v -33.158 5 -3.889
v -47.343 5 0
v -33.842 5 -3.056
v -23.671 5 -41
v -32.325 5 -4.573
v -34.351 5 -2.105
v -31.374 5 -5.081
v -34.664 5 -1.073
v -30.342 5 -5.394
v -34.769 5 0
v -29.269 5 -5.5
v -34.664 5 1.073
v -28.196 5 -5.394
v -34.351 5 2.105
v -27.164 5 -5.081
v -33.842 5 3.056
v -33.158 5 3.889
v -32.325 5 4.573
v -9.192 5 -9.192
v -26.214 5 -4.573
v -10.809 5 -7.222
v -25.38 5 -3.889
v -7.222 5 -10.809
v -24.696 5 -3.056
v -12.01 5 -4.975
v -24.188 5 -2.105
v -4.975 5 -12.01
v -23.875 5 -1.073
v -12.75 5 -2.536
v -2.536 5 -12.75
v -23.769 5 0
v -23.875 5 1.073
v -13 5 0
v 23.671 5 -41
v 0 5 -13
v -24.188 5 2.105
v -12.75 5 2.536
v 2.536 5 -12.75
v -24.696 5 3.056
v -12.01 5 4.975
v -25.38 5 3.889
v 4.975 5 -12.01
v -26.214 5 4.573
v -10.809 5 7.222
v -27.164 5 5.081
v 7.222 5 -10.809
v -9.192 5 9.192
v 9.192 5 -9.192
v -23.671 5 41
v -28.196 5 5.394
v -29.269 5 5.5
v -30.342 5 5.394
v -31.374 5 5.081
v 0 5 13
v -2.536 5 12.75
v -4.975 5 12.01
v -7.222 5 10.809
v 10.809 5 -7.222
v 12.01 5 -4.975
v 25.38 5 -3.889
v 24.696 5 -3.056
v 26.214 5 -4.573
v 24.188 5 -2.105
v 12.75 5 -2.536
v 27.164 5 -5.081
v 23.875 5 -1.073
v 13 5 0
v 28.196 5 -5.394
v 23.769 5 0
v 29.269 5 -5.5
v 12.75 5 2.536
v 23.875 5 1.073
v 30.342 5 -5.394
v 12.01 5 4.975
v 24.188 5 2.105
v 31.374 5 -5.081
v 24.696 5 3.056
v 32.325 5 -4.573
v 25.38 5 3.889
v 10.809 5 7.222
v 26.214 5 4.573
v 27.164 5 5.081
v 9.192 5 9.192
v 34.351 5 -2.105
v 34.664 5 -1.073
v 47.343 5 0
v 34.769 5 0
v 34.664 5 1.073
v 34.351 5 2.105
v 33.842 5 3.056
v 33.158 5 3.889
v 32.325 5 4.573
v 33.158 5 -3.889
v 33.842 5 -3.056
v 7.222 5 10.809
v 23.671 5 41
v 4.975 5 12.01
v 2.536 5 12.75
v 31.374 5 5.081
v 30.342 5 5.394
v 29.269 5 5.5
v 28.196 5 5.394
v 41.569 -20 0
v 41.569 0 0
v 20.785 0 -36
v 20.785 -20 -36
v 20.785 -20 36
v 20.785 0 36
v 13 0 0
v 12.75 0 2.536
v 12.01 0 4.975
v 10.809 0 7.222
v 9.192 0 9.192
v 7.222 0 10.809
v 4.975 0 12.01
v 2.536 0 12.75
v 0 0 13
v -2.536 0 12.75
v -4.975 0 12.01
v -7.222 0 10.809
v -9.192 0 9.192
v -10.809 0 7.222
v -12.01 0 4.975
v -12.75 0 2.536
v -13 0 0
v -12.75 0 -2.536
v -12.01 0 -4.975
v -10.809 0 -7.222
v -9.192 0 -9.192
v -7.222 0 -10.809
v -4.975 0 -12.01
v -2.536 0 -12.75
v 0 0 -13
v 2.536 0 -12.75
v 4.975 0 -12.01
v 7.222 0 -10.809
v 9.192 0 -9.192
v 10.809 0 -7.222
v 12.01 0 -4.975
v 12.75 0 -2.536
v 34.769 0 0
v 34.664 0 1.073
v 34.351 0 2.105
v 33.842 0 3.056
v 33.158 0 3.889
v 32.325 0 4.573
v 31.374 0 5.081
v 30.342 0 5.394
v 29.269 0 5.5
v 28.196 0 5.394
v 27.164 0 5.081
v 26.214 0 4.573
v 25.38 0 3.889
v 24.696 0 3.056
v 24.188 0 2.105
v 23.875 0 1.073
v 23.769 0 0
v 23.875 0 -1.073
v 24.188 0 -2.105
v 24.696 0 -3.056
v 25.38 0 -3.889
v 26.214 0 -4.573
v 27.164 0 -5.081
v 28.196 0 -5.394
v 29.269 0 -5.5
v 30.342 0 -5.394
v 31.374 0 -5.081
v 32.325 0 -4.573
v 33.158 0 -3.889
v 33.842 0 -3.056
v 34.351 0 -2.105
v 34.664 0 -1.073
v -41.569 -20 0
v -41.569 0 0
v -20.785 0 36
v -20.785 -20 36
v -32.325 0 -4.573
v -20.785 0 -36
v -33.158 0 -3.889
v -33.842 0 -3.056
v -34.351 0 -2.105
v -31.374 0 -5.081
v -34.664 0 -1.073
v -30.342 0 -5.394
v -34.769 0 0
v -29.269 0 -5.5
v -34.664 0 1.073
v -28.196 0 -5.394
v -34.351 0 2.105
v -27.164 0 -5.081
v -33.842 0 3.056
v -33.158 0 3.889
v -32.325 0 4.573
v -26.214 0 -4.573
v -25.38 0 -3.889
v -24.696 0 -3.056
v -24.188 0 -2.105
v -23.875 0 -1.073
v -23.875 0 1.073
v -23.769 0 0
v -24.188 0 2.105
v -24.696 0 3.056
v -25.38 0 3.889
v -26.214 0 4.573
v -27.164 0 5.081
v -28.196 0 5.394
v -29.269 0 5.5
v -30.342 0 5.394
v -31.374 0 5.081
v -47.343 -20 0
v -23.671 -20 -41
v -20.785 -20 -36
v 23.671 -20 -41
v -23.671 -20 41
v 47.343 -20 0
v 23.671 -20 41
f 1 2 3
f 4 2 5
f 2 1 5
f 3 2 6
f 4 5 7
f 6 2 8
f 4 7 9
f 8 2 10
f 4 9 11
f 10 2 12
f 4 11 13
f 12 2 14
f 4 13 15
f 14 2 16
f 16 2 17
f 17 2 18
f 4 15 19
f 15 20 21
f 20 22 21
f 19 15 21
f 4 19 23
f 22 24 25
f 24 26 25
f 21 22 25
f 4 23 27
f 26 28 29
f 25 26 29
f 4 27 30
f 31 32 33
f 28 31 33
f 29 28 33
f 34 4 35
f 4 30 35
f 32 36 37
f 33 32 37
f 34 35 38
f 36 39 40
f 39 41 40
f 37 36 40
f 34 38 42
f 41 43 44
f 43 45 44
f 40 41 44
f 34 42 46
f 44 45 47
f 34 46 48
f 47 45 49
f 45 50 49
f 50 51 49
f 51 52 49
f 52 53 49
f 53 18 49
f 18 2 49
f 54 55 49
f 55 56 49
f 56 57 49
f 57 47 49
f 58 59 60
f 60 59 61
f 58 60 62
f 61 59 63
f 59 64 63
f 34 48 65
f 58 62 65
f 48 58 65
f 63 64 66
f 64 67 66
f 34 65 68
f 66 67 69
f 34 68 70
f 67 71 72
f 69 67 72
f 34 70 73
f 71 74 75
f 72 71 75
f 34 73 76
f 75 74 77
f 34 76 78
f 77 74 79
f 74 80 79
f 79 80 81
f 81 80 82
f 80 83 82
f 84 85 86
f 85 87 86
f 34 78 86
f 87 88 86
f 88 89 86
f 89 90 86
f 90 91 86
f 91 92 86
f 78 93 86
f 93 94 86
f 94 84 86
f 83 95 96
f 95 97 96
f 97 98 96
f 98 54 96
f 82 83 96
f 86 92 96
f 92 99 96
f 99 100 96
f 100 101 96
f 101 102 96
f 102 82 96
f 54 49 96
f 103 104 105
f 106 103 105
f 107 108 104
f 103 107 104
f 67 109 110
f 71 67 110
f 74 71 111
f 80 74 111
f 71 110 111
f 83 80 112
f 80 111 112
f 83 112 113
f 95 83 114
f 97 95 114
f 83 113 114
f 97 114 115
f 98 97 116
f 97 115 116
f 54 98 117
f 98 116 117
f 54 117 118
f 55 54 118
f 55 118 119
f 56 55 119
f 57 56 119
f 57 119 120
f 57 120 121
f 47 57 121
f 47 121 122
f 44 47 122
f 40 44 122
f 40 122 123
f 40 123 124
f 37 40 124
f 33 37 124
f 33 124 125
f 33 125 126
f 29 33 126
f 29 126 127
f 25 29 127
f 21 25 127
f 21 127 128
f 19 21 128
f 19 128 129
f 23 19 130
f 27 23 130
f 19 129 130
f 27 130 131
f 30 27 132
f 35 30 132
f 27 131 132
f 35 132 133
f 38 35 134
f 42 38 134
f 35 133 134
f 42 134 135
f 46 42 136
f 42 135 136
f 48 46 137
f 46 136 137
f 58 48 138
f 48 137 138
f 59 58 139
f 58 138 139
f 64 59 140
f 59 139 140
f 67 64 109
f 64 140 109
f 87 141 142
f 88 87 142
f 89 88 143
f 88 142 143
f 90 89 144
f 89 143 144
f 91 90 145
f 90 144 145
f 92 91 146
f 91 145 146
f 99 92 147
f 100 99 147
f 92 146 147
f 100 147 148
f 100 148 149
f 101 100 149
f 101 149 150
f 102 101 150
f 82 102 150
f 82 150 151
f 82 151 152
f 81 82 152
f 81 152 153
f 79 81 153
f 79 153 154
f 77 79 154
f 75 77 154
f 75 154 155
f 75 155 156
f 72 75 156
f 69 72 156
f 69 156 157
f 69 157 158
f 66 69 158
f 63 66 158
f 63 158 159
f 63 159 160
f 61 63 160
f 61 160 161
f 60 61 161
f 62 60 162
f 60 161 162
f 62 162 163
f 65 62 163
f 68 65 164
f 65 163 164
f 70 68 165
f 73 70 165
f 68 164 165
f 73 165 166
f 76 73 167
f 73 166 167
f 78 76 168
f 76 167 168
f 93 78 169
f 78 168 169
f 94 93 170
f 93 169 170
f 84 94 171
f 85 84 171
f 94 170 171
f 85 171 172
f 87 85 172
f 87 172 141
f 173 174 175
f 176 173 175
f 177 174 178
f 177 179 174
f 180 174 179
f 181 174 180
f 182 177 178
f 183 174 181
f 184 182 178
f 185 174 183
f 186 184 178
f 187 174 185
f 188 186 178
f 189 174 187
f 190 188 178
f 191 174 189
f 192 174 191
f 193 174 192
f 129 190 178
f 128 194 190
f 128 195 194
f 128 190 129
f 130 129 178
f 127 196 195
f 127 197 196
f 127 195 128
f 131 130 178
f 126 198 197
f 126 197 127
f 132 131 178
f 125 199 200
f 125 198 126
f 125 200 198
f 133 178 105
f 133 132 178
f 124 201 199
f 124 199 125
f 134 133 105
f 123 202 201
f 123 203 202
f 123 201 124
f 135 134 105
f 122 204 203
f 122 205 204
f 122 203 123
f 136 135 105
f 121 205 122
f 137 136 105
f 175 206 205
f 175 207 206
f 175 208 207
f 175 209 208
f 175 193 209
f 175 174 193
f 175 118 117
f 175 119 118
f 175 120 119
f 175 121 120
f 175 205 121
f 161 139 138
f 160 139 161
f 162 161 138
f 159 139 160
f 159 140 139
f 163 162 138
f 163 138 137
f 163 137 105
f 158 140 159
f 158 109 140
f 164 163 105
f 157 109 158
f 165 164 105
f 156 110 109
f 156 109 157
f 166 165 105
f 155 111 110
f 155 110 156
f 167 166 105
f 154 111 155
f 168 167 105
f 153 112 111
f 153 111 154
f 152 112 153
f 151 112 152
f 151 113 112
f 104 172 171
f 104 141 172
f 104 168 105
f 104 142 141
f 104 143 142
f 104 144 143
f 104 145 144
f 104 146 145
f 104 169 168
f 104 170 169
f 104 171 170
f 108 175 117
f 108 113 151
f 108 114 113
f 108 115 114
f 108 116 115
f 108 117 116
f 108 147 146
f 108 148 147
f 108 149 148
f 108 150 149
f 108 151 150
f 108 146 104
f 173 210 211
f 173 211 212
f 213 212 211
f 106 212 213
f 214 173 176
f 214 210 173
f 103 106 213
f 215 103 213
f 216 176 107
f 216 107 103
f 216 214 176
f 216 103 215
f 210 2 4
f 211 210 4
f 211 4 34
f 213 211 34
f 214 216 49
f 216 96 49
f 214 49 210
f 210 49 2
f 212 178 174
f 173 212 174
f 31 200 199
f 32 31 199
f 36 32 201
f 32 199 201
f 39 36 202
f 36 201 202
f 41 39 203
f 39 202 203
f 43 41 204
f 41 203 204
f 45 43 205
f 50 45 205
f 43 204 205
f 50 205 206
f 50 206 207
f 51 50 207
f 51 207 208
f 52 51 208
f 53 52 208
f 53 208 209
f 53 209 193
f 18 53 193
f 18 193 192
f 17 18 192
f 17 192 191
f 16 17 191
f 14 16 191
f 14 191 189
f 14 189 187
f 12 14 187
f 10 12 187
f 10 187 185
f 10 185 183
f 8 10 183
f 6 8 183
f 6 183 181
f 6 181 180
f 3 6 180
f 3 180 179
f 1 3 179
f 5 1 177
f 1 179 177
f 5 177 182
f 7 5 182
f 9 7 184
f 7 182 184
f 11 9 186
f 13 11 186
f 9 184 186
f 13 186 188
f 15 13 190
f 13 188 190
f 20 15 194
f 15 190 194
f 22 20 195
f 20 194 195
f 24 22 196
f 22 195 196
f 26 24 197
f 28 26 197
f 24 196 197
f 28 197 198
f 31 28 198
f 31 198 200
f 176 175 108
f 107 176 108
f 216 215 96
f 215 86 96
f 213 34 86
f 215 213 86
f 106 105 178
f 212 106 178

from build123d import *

# Parameters (mm, degrees)
F1_DEPTH = 5
F2_DEPTH = 20
F3_R     = 13
F4_DEPTH = 25
F5_R     = 5.5
F6_DEPTH = 25


with BuildPart() as f1:
    # F0 (on Front) → F1 (new body)
    with BuildSketch(Plane.XZ):
        Polygon((23.6713610368, -41), (47.3427220735, 0), (23.6713610368, 41), (-23.6713610368, 41), (-47.3427220735, 0), (-23.6713610368, -41), align=None)
        Polygon((20.7846096908, 36), (41.5692193817, 0), (20.7846096908, -36), (-20.7846096908, -36), (-41.5692193817, 0), (-20.7846096908, 36), align=None, mode=Mode.SUBTRACT)
        Polygon((20.7846096908, -36), (41.5692193817, 0), (20.7846096908, 36), (-20.7846096908, 36), (-41.5692193817, 0), (-20.7846096908, -36), align=None)
    extrude(amount=-F1_DEPTH)

    # F0 (on Front) → F2 (join)
    with BuildSketch(Plane.XZ):
        Polygon((23.6713610368, -41), (47.3427220735, 0), (23.6713610368, 41), (-23.6713610368, 41), (-47.3427220735, 0), (-23.6713610368, -41), align=None)
        Polygon((20.7846096908, 36), (41.5692193817, 0), (20.7846096908, -36), (-20.7846096908, -36), (-41.5692193817, 0), (-20.7846096908, 36), align=None, mode=Mode.SUBTRACT)
    extrude(amount=F2_DEPTH)

    # F3 (on face) → F4 (cut)
    with BuildSketch(Plane.XZ):
        Circle(F3_R)
    extrude(amount=-F4_DEPTH, mode=Mode.SUBTRACT)

    # F5 (on face) → F6 (cut)
    with BuildSketch(Plane.XZ):
        with Locations((29.2692193817, 0)):
            Circle(F5_R)
        with Locations((-29.2692193817, 0)):
            Circle(F5_R)
    extrude(amount=-F6_DEPTH, mode=Mode.SUBTRACT)


solid = f1.part
